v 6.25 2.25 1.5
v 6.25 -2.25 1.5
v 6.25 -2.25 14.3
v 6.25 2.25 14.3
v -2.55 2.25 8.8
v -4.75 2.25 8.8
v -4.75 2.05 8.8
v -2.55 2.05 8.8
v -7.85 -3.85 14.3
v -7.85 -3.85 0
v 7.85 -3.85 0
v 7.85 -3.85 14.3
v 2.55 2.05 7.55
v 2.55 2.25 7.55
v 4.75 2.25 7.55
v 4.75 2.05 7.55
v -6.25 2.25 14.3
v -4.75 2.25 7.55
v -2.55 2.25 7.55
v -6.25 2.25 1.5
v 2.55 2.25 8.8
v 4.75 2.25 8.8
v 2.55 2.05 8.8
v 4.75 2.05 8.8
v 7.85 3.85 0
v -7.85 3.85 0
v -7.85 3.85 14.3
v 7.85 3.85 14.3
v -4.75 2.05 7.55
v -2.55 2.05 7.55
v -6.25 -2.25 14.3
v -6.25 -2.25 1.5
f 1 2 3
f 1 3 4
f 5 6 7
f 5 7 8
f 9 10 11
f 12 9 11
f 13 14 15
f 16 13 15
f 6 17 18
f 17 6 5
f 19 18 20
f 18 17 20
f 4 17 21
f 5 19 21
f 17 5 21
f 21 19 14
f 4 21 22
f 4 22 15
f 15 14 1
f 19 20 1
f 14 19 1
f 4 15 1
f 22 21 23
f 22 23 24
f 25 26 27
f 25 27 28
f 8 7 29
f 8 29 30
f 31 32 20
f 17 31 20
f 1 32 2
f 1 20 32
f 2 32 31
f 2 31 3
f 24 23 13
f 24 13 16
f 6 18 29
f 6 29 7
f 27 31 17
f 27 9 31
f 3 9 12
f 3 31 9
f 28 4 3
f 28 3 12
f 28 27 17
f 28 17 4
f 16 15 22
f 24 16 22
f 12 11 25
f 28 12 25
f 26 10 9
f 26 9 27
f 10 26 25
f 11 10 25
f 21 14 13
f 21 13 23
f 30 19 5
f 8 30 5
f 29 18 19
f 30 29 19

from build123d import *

# Parameters (mm, degrees)
F0_W     = 15.7
F0_H     = 7.7
F0_W_2   = 12.5
F0_H_2   = 4.5
F1_DEPTH = 1.5
F2_DEPTH = 14.3
F3_W     = 2.2
F3_H     = 1.25
F4_DEPTH = 0.2


with BuildPart() as f1:
    # F0 (on Top) → F1 (new body)
    with BuildSketch(Plane.XY):
        Rectangle(F0_W, F0_H)
        Rectangle(F0_W_2, F0_H_2, mode=Mode.SUBTRACT)
        Rectangle(F0_W_2, F0_H_2)
    extrude(amount=F1_DEPTH)

    # F0 (on Top) → F2 (join)
    with BuildSketch(Plane.XY):
        Rectangle(F0_W, F0_H)
        Rectangle(F0_W_2, F0_H_2, mode=Mode.SUBTRACT)
    extrude(amount=F2_DEPTH)

    # F3 (on face) → F4 (join)
    with BuildSketch(Plane.XZ.offset(-2.25)):
        with Locations((3.65, 8.175)):
            Rectangle(F3_W, F3_H)
        with Locations((-3.65, 8.175)):
            Rectangle(F3_W, F3_H)
    extrude(amount=F4_DEPTH)


solid = f1.part
